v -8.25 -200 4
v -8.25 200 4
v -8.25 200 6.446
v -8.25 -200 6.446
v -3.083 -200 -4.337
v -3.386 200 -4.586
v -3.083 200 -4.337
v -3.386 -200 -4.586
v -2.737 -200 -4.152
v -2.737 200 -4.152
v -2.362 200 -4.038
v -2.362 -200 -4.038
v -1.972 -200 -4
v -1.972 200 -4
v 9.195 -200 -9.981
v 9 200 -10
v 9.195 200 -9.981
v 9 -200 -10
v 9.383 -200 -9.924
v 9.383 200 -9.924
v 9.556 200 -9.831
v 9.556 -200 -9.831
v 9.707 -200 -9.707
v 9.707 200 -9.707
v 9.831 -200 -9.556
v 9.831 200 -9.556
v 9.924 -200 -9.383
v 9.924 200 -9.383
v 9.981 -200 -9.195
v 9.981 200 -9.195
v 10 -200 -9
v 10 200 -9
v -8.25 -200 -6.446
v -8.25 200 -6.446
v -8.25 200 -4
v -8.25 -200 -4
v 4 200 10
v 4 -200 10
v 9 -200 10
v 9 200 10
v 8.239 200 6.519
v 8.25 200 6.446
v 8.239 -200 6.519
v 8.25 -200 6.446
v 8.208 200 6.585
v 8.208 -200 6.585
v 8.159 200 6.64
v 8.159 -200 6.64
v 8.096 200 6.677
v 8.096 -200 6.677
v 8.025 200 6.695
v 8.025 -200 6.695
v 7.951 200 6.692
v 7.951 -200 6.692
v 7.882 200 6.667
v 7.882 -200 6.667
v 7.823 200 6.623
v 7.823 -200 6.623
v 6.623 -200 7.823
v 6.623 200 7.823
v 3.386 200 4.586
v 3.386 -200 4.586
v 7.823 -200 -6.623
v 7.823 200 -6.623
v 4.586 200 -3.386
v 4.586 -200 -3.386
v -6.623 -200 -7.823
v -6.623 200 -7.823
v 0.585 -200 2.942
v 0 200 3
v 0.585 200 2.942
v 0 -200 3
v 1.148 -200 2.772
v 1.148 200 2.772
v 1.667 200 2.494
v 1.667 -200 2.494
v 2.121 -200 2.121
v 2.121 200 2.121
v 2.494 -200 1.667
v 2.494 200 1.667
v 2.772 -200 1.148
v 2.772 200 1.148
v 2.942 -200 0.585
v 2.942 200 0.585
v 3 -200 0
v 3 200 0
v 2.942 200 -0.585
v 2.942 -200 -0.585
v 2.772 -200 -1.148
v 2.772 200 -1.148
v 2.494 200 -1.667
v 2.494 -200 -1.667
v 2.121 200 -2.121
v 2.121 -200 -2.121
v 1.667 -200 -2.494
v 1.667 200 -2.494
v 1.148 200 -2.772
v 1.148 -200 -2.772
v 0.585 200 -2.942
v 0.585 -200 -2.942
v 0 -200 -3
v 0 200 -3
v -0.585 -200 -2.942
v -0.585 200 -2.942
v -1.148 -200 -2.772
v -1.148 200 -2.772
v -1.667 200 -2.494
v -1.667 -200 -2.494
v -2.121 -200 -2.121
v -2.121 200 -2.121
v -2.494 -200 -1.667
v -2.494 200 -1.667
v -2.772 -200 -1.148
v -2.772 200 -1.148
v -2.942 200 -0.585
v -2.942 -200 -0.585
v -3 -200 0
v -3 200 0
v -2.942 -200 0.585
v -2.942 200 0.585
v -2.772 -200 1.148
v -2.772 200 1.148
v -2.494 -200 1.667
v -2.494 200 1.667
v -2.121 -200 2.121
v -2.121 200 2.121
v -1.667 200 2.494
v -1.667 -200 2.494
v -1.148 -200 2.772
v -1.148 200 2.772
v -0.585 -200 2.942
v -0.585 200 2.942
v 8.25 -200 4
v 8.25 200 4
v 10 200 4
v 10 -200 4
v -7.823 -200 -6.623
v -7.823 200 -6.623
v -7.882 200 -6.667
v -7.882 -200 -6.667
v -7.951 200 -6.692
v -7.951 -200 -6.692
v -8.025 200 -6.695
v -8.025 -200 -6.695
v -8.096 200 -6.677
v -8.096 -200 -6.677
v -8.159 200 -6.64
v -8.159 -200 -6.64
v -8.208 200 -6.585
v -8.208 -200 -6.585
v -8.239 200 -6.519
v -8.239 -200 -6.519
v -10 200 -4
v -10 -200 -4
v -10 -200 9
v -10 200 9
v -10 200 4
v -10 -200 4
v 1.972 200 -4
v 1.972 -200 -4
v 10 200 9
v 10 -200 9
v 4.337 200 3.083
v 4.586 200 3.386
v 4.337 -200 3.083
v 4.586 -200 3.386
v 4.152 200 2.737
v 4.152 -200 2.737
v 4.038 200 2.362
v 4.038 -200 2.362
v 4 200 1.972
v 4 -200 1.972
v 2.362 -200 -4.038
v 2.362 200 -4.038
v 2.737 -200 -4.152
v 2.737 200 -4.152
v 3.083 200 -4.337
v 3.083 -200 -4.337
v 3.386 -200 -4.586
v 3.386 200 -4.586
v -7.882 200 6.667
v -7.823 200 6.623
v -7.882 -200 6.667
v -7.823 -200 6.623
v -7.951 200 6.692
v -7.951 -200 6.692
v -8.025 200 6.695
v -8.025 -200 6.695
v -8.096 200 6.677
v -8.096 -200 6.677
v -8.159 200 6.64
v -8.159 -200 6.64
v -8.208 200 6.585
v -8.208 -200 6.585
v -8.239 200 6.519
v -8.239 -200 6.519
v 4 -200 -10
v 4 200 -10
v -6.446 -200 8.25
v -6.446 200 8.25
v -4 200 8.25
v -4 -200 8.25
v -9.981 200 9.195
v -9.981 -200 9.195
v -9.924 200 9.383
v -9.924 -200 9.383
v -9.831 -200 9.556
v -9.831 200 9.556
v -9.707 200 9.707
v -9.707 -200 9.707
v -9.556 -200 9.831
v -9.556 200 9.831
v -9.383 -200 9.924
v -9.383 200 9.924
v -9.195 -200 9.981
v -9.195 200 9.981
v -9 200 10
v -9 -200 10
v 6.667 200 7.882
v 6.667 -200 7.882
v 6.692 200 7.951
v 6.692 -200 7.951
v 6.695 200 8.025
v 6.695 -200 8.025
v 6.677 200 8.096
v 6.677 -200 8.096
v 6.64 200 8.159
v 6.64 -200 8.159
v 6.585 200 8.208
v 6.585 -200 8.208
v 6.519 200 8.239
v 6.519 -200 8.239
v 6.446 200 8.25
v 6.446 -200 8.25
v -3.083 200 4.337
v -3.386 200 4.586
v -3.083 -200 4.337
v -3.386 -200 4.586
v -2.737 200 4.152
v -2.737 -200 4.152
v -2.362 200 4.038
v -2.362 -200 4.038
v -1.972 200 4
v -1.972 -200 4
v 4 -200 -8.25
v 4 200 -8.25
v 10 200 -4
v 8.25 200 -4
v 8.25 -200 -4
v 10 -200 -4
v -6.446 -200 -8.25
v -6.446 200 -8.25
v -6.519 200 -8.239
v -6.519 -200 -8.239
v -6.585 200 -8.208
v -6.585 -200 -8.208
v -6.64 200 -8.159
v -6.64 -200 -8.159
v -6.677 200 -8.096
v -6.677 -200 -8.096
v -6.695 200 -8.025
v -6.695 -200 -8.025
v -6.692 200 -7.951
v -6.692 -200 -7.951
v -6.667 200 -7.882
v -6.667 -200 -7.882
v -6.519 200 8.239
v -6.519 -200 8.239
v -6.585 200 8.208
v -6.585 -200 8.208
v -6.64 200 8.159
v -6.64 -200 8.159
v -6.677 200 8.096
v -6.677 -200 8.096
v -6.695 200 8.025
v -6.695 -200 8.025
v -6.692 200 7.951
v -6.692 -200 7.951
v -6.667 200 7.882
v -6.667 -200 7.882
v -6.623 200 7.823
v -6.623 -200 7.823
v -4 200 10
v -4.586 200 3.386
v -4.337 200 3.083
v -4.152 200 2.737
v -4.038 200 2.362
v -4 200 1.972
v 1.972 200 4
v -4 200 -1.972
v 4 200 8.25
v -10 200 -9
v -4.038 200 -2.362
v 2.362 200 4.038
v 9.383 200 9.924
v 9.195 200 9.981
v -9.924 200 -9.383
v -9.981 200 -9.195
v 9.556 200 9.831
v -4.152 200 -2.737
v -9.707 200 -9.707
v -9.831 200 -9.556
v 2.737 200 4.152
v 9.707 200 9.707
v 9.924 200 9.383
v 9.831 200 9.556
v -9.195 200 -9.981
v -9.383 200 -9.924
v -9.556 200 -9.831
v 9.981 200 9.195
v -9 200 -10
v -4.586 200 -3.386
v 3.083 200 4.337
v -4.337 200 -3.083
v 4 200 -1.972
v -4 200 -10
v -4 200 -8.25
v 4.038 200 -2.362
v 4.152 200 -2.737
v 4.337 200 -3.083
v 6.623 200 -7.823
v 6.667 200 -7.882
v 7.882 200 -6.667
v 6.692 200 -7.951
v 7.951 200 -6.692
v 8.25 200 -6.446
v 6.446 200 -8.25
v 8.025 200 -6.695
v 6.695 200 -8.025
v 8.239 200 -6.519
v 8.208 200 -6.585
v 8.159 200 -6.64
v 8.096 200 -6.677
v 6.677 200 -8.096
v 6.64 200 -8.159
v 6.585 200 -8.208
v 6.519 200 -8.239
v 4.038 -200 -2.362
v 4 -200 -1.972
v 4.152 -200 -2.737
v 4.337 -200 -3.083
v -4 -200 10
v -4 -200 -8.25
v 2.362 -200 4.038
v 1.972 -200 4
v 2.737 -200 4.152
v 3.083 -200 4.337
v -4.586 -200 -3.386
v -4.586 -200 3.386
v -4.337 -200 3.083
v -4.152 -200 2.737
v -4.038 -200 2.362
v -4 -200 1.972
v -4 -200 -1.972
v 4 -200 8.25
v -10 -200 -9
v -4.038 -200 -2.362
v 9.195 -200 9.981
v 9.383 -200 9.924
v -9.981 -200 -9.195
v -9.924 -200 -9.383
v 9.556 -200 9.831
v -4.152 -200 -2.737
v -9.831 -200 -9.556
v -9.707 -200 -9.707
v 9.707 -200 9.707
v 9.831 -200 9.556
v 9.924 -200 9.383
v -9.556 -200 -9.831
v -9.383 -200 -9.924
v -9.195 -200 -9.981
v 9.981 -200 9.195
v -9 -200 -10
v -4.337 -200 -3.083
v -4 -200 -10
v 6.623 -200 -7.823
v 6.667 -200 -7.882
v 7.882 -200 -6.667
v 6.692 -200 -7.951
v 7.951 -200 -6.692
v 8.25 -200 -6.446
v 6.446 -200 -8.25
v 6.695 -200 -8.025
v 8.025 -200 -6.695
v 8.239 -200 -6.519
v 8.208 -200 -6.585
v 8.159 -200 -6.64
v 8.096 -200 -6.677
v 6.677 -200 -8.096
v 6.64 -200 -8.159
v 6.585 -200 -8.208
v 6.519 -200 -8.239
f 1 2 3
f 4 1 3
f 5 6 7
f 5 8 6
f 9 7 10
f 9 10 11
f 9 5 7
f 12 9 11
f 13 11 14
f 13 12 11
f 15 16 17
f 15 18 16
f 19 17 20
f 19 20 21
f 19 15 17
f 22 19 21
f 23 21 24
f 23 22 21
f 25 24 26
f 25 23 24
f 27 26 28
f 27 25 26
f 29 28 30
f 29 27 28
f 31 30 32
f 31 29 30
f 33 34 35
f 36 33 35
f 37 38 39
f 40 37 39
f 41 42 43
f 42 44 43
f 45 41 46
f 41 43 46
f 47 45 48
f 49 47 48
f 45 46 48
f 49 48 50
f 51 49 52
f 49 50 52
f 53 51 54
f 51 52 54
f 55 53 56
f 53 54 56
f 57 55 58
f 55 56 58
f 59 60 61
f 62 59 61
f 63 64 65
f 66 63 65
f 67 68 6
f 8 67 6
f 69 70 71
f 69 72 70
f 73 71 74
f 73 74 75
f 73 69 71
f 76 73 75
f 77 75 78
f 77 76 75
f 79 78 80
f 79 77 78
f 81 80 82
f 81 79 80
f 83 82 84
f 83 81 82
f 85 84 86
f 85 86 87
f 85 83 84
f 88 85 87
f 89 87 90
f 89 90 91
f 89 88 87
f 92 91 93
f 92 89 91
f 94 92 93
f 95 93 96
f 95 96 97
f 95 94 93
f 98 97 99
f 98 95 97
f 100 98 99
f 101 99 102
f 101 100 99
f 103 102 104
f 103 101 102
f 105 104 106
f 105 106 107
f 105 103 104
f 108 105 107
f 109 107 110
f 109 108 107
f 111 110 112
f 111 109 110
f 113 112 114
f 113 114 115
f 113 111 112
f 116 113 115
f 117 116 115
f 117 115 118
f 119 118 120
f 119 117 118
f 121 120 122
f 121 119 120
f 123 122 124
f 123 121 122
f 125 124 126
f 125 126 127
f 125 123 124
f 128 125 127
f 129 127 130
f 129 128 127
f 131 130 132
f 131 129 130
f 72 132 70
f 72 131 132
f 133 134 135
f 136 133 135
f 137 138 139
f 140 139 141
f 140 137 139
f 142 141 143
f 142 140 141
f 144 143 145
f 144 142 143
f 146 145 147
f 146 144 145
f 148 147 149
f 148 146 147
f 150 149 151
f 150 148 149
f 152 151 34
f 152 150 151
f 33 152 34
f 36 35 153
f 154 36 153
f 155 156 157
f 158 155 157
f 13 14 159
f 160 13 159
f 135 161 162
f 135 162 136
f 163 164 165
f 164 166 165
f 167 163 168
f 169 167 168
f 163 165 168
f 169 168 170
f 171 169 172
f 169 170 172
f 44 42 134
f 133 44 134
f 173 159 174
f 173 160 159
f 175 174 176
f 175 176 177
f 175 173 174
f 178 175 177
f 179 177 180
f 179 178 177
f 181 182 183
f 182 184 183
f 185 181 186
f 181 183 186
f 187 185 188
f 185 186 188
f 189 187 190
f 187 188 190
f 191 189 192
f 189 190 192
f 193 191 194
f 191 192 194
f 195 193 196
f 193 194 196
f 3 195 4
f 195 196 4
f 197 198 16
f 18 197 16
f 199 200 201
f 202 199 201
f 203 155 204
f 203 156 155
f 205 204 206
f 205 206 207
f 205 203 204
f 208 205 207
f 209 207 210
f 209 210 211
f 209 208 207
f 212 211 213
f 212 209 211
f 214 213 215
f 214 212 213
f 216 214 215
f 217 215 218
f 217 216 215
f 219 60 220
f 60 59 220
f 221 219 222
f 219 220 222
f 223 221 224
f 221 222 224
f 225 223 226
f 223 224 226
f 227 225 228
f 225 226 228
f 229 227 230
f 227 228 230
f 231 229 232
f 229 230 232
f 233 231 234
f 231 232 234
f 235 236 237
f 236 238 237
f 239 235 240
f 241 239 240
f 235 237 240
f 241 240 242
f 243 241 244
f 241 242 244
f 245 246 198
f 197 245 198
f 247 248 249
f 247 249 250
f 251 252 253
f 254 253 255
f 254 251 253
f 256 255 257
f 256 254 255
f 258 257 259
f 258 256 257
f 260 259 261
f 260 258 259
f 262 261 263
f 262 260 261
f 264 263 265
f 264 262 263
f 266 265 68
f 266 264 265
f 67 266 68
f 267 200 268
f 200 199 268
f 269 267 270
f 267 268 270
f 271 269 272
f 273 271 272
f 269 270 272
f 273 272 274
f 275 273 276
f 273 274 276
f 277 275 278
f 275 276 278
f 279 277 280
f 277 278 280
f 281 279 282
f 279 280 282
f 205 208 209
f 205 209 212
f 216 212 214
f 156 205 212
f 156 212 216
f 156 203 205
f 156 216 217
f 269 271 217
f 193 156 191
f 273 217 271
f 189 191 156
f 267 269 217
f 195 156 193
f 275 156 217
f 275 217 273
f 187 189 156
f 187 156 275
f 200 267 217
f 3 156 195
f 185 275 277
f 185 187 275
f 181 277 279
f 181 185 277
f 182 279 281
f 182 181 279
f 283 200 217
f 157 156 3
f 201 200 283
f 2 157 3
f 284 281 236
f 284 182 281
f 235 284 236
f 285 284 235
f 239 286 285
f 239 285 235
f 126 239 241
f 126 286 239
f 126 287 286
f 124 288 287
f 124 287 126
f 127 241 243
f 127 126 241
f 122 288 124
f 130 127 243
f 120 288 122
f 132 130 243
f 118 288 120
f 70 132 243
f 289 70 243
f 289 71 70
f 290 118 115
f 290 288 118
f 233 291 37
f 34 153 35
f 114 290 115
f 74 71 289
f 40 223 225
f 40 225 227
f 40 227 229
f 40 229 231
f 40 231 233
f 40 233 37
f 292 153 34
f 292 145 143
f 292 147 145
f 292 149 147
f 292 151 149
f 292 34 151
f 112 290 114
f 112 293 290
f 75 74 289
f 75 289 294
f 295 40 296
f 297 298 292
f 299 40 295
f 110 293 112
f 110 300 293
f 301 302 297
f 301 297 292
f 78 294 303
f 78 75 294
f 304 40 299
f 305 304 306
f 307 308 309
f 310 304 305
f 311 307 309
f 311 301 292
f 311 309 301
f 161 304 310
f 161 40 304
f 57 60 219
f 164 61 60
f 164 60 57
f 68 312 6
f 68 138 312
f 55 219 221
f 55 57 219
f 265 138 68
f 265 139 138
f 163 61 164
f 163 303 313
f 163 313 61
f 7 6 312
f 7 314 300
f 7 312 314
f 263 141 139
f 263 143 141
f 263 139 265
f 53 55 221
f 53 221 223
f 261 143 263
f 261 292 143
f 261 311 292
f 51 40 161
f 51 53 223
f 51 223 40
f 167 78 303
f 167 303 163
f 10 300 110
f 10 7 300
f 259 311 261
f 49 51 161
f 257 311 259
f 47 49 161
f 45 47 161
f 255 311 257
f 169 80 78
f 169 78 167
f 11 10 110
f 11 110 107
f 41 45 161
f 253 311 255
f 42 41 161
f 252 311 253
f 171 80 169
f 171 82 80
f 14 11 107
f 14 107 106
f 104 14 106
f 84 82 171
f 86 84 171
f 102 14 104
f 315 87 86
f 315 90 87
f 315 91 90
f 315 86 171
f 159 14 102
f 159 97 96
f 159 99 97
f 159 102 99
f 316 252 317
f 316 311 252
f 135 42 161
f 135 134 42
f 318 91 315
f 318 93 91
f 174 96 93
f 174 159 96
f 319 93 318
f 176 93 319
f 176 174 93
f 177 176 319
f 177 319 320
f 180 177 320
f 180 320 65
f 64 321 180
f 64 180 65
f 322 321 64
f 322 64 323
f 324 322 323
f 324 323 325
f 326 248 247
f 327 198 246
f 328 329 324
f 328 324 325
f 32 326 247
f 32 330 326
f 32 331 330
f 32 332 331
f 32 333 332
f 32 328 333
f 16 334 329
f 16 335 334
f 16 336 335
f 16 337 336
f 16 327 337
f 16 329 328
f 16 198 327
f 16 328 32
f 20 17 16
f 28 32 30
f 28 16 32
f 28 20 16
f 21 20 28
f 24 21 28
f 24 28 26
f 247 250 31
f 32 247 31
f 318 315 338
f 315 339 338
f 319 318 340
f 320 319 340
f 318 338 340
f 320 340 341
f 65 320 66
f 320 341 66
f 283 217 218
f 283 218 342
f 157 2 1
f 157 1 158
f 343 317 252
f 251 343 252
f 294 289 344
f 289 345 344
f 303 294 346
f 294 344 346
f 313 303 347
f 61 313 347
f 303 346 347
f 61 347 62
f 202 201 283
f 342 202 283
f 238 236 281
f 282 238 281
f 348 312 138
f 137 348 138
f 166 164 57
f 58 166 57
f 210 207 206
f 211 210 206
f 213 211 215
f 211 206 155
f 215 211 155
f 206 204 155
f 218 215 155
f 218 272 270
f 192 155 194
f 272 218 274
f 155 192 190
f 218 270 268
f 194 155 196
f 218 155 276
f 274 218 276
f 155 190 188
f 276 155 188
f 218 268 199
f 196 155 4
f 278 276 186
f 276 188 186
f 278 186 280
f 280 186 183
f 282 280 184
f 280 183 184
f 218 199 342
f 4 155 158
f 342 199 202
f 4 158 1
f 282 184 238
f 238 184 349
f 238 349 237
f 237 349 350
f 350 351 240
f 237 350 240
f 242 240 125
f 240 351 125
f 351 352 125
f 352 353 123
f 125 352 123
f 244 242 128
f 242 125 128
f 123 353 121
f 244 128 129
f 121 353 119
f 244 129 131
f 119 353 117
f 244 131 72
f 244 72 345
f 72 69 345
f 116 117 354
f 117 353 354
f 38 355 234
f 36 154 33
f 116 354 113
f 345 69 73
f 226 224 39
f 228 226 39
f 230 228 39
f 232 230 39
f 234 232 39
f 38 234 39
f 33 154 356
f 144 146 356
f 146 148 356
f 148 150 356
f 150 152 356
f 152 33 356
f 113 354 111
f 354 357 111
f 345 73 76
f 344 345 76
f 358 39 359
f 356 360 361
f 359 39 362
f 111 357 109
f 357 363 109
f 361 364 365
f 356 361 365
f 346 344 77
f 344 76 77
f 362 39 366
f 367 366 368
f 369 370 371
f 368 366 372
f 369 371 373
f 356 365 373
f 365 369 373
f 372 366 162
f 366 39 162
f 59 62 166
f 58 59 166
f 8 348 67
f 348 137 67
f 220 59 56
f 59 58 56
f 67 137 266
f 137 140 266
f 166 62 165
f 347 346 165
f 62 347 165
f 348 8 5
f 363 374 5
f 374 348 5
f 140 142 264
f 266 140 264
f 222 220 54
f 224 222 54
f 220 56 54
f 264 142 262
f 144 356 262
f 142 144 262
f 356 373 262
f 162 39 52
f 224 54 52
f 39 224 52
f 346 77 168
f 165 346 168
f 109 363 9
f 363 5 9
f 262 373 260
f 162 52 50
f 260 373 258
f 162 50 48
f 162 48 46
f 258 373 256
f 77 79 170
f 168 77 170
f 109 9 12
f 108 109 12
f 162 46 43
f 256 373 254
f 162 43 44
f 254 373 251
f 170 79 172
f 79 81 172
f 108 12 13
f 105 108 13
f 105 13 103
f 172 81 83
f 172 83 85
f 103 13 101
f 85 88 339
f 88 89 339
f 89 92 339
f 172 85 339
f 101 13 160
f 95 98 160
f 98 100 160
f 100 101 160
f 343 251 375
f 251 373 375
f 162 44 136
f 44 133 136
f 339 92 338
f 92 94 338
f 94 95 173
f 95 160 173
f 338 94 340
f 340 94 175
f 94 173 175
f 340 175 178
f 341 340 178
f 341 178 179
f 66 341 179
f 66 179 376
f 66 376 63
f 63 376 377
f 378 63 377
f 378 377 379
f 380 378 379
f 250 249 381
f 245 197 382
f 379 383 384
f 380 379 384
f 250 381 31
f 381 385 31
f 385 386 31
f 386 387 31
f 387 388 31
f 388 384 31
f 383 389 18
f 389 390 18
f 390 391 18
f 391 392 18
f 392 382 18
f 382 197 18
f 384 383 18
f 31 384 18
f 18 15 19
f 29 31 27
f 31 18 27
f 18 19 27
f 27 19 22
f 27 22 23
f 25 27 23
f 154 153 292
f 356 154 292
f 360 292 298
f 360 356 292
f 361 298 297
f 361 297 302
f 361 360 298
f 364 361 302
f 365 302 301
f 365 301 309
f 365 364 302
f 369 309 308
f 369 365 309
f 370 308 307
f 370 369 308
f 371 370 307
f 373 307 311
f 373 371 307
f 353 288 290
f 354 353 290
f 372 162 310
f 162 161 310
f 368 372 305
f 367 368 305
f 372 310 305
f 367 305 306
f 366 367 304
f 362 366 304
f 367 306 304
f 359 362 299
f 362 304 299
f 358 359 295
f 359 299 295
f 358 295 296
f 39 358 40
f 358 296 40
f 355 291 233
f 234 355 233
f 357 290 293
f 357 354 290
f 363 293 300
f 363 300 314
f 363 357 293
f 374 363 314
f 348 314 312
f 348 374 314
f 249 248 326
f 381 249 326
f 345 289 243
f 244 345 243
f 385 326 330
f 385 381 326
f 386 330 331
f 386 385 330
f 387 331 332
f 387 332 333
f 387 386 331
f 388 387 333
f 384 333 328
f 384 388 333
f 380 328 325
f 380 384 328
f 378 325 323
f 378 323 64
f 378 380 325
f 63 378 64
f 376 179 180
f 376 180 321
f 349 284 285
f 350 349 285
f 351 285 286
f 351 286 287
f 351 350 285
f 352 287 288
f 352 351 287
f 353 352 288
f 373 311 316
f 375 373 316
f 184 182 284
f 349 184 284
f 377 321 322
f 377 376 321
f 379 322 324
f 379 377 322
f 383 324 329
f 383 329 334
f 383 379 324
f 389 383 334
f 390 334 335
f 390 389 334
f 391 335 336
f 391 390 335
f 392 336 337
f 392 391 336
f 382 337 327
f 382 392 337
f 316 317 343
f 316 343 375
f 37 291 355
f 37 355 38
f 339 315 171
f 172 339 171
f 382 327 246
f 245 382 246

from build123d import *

# Parameters (mm, degrees)
ESBO_O1_W                = 20
ESBO_O1_H                = 20
ESBO_O1_R                = 3
RESSALTO_EXTRUS_O1_DEPTH = 200
ESBO_O2_W                = 8
ESBO_O2_H                = 1.75
CORTE_EXTRUS_O1_DEPTH    = 401.249921924
PADR_OCIRCULAR2_COUNT    = 4
FILETE2_R                = 1
FILETE3_R                = 2
FILETE4_R                = 0.25


with BuildPart() as part:
    # Esboço1 → Ressalto-extrusão1 (new, symmetric)
    with BuildSketch(Plane(origin=(0, 0, 0), x_dir=(1, 0, 0), z_dir=(0, 1, 0))):
        Rectangle(ESBO_O1_W, ESBO_O1_H)
        with Locations(Location((0, 0, 0), (0, 0, 270))):
            Circle(ESBO_O1_R, mode=Mode.SUBTRACT)
    extrude(amount=RESSALTO_EXTRUS_O1_DEPTH, both=True)

    # Esboço2 → Corte-extrusão1 (cut, through all)
    with BuildSketch(Plane(origin=(0, 200, 0), x_dir=(1, 0, 0), z_dir=(0, 1, 0))):
        Polygon((-7.05, 8.25), (-2.8, 4), (2.8, 4), (7.05, 8.25), (4, 8.25), (-4, 8.25), align=None)
        with Locations((0, 9.125)):
            Rectangle(ESBO_O2_W, ESBO_O2_H)
    corte_extrus_o1 = extrude(amount=-CORTE_EXTRUS_O1_DEPTH, mode=Mode.SUBTRACT)

    # PadrãoCircular2: Corte-extrusão1 ×4 about axis
    padr_ocircular2_axis = Axis((0, 0, 0), (0, 1, 0))
    for i in range(1, PADR_OCIRCULAR2_COUNT):
        add(corte_extrus_o1.rotate(padr_ocircular2_axis, i * 360 / PADR_OCIRCULAR2_COUNT), mode=Mode.SUBTRACT)

    # Filete2
    filete2_edges = [part.edges().sort_by_distance(p)[0] for p in [
        (10, 0, 10),
        (-10, 0, 10),
        (-10, 0, -10),
        (10, 0, -10),
    ]]
    fillet(filete2_edges, radius=FILETE2_R)

    # Filete3
    filete3_edges = [part.edges().sort_by_distance(p)[0] for p in [
        (-4, 0, -2.8),
        (-4, 0, 2.8),
        (2.8, 0, -4),
        (-2.8, 0, -4),
        (4, 0, 2.8),
        (4, 0, -2.8),
        (-2.8, 0, 4),
        (2.8, 0, 4),
    ]]
    fillet(filete3_edges, radius=FILETE3_R)

    # Filete4
    filete4_edges = [part.edges().sort_by_distance(p)[0] for p in [
        (-8.25, 0, -7.05),
        (-8.25, 0, 7.05),
        (7.05, 0, -8.25),
        (-7.05, 0, -8.25),
        (8.25, 0, 7.05),
        (8.25, 0, -7.05),
        (-7.05, 0, 8.25),
        (7.05, 0, 8.25),
    ]]
    fillet(filete4_edges, radius=FILETE4_R)


solid = part.part
